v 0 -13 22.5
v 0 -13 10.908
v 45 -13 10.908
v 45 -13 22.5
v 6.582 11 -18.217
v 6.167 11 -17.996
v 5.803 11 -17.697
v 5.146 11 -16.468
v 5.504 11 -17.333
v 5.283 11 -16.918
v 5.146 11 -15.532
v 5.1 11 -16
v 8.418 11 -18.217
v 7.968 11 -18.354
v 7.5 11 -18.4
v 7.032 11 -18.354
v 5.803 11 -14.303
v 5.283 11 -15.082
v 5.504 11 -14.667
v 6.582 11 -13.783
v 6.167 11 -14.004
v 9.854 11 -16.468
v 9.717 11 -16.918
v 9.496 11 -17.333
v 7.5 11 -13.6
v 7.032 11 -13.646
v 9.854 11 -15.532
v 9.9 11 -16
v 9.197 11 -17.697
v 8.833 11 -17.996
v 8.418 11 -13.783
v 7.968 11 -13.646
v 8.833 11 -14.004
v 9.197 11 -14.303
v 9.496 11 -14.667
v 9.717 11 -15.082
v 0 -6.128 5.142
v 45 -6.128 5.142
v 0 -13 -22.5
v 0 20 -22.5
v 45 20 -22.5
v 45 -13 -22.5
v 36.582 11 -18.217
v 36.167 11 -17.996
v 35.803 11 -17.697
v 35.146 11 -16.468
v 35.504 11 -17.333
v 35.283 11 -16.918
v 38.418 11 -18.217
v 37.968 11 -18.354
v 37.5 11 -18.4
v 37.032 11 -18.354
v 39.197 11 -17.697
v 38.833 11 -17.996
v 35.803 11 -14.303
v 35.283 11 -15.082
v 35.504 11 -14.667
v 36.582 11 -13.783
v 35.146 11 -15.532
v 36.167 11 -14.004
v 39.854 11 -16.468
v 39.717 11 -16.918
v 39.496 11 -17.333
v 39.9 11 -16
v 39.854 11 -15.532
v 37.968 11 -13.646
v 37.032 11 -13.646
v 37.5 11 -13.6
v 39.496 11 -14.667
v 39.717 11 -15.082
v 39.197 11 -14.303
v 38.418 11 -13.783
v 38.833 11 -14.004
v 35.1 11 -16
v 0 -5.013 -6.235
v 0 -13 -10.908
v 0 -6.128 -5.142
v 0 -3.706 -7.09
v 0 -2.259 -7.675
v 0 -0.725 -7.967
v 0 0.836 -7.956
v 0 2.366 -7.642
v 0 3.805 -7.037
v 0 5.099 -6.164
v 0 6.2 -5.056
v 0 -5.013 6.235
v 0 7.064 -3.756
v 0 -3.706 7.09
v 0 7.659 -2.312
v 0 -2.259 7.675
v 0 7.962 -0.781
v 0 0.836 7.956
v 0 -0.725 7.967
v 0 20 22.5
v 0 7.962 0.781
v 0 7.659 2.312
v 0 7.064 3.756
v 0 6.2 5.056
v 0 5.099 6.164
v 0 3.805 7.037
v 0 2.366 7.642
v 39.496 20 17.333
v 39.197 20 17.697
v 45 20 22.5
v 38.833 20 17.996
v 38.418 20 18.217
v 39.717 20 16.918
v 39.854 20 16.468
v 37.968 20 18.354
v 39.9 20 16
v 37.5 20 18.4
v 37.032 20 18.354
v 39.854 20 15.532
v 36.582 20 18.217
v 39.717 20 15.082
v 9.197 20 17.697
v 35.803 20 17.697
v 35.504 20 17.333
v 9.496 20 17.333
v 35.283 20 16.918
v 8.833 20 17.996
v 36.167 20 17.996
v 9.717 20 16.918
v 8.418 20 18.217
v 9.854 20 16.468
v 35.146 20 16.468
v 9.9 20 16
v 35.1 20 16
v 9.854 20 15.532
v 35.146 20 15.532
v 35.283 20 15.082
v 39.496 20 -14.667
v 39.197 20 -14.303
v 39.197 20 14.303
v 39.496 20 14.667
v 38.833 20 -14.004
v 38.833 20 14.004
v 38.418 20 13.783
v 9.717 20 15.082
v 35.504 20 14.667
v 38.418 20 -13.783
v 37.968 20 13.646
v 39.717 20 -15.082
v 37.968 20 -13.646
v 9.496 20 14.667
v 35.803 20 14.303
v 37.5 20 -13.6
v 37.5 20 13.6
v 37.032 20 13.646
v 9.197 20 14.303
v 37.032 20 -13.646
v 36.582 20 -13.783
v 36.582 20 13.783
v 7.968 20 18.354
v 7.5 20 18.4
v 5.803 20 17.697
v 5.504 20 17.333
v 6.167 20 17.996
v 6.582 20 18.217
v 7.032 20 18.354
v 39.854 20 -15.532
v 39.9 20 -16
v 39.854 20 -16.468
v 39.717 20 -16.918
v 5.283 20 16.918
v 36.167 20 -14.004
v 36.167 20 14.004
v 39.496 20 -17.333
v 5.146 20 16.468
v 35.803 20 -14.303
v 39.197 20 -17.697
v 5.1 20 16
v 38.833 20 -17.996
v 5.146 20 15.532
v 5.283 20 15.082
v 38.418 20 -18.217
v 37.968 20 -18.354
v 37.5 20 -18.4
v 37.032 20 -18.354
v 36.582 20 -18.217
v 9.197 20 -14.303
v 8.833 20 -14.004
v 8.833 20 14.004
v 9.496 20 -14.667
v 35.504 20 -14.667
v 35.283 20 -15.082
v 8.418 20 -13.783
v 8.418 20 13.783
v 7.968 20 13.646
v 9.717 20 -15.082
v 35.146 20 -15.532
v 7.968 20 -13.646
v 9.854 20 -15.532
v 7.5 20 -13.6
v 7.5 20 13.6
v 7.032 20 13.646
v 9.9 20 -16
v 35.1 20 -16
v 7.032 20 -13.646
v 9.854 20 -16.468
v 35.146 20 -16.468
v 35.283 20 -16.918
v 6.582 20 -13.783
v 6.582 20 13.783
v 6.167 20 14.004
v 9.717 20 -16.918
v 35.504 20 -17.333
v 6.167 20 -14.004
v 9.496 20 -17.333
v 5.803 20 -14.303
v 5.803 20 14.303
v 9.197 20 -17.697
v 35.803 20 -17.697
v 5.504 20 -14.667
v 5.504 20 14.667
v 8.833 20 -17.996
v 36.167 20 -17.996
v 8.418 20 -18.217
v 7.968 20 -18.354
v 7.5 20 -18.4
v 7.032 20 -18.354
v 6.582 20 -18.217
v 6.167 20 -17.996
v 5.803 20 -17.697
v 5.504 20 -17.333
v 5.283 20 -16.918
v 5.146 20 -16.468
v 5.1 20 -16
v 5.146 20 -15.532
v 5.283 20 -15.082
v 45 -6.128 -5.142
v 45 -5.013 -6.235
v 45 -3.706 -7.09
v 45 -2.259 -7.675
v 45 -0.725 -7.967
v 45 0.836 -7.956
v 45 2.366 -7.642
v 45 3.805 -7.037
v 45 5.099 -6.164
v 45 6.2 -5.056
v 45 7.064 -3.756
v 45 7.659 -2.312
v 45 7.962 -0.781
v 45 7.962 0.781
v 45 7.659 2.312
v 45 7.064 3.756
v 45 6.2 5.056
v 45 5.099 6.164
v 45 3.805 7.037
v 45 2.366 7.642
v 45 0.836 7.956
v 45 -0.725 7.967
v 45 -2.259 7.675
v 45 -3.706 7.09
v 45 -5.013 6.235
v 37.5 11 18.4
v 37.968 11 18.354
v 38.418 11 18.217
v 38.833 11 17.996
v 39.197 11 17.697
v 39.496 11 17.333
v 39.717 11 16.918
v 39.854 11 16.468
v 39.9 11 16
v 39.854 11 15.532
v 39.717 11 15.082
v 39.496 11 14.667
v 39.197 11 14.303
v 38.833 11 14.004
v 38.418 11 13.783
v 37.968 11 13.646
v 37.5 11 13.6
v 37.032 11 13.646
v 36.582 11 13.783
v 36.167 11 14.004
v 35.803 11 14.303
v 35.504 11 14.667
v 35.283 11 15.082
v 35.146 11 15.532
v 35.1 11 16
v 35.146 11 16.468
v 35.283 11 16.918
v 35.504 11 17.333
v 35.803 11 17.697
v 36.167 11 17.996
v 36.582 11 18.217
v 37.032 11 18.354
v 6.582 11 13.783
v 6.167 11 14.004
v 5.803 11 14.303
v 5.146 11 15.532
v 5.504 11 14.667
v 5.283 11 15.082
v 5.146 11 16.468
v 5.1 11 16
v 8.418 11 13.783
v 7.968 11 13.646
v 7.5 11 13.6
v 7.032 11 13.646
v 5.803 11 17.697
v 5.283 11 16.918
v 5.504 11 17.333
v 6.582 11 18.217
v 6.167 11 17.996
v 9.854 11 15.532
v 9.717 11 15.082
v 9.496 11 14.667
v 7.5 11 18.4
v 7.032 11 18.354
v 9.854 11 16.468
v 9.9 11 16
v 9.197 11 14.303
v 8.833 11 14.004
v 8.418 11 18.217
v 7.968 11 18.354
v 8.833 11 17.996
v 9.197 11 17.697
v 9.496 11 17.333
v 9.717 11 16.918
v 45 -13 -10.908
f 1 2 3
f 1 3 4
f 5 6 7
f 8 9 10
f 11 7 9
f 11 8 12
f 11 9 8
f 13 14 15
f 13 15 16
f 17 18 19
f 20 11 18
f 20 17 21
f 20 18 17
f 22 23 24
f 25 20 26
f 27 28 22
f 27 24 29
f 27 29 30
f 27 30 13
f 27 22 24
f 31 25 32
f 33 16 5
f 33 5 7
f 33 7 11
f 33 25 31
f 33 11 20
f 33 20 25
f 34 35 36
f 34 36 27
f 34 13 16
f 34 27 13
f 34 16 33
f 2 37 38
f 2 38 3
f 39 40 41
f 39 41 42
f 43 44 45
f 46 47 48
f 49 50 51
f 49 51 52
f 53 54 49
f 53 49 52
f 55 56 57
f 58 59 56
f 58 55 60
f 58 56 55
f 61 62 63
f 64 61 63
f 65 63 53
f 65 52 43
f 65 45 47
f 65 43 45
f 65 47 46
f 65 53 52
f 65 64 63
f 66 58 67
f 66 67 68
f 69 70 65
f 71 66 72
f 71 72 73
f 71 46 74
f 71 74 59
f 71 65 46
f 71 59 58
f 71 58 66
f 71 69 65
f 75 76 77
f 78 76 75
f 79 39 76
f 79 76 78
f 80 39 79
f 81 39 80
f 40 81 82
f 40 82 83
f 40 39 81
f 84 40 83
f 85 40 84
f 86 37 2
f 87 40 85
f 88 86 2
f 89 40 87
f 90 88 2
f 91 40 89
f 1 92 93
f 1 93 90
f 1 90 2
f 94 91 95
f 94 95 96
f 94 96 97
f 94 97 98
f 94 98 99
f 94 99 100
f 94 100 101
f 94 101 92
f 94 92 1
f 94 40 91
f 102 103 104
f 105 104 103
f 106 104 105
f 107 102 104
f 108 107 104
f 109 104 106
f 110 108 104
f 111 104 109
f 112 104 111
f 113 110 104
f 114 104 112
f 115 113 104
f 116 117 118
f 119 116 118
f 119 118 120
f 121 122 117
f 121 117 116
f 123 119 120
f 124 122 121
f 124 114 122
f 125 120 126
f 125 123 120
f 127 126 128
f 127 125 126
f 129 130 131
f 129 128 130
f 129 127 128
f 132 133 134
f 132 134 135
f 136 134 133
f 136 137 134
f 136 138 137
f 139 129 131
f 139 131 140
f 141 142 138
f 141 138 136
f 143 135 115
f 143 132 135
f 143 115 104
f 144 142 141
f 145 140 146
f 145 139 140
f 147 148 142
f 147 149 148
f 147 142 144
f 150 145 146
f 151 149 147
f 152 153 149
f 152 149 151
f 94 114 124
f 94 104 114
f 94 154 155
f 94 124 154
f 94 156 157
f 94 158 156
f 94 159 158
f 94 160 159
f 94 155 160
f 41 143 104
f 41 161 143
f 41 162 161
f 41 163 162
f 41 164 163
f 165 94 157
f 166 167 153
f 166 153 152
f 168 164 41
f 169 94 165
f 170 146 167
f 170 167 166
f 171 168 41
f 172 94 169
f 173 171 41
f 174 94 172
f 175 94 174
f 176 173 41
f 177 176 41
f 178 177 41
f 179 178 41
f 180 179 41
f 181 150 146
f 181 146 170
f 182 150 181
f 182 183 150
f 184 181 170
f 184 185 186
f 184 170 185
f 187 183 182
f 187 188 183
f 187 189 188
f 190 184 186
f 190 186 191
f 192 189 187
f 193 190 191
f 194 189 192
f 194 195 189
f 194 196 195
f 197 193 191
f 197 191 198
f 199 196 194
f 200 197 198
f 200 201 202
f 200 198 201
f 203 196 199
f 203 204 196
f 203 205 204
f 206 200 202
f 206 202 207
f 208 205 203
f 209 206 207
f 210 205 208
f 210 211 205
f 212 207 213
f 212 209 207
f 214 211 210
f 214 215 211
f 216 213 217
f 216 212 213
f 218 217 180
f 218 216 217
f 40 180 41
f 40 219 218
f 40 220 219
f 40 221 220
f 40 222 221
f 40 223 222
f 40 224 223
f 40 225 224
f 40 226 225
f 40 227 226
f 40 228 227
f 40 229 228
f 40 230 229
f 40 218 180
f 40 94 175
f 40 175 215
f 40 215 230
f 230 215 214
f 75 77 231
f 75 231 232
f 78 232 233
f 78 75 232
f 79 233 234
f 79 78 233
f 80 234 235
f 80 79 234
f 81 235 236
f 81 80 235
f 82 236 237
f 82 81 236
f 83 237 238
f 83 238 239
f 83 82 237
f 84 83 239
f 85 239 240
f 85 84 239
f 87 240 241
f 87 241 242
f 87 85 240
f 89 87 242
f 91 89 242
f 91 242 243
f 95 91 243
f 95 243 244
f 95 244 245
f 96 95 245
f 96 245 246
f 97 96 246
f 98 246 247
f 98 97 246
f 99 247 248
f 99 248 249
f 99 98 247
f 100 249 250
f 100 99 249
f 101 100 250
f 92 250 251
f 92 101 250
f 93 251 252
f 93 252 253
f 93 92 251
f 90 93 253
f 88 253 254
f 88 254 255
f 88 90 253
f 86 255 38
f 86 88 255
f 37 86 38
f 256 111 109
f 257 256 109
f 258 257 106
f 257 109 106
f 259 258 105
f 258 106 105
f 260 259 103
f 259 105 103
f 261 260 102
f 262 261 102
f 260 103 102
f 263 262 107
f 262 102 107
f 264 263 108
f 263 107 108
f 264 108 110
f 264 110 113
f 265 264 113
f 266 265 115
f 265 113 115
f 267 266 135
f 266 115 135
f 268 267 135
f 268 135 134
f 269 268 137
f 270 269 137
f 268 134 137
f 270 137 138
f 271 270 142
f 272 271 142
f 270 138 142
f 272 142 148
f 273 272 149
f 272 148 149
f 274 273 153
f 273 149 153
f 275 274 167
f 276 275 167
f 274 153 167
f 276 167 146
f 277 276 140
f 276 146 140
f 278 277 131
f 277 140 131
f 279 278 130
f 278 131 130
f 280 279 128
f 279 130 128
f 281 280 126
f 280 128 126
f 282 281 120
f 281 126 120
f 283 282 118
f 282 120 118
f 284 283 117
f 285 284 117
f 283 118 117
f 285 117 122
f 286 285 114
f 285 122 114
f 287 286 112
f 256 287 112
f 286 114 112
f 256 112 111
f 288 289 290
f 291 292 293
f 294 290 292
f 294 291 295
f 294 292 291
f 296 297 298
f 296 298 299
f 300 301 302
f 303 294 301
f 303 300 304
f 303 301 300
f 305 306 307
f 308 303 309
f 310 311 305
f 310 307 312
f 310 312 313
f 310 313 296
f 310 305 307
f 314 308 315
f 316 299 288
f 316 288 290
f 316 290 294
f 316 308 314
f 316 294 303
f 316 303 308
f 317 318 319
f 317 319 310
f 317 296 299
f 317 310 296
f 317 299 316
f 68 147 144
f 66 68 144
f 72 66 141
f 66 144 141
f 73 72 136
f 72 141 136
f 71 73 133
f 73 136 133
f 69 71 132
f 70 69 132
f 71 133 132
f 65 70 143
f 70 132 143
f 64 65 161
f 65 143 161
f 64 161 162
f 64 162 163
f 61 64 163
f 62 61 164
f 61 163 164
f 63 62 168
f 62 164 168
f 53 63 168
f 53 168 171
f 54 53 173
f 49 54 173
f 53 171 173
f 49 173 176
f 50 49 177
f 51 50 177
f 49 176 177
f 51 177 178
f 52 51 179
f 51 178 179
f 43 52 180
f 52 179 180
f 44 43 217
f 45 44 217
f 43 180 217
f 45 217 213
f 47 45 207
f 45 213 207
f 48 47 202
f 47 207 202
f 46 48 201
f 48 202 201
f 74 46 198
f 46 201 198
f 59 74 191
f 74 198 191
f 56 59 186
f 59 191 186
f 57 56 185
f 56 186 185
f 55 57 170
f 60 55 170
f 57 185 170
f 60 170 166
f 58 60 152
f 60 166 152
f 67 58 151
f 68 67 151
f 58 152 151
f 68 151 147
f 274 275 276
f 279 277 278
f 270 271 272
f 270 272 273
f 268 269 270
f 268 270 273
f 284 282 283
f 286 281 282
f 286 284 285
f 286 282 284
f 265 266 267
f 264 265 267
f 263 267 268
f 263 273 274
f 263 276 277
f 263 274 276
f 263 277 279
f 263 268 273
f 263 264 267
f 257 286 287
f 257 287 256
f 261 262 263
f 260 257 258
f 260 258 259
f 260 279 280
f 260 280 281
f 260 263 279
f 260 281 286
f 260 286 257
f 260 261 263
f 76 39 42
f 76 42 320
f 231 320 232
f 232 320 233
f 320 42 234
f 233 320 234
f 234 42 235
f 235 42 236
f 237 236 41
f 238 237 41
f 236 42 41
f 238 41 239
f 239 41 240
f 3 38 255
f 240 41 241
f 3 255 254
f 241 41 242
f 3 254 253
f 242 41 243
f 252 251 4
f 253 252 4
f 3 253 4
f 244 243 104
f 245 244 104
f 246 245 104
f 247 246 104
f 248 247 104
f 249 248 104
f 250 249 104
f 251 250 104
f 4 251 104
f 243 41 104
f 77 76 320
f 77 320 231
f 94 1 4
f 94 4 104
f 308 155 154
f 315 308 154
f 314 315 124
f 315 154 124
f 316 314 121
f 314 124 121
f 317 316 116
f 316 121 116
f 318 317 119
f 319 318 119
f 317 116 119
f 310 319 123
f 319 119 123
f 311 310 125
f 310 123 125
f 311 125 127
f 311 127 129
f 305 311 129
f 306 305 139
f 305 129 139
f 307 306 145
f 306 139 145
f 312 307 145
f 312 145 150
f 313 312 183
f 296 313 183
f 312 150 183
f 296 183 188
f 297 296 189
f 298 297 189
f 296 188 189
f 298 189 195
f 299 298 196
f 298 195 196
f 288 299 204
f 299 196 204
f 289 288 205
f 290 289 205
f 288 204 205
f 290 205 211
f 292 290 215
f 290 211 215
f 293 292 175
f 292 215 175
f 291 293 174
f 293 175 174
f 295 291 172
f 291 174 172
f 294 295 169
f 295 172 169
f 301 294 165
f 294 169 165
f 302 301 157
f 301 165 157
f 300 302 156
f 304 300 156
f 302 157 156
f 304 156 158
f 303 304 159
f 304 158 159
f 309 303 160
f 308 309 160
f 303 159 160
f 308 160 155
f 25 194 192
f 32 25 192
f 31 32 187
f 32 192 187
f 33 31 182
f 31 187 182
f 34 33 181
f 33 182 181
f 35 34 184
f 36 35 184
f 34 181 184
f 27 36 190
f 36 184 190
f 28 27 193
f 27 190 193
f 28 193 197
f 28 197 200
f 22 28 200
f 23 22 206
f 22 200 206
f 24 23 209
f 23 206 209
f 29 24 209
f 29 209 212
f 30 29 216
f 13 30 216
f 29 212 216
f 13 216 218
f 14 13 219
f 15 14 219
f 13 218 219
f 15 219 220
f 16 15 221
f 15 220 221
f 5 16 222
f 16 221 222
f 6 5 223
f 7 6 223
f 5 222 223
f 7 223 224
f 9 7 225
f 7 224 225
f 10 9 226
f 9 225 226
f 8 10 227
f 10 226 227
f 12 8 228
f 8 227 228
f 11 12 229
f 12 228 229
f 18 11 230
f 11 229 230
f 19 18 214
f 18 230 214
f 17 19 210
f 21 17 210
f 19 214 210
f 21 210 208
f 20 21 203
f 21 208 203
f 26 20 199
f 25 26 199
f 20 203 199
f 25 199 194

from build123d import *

# Parameters (mm, degrees)
EXTRUDE_1_DEPTH     = 45
SKETCH_2_R          = 2.4
CUT_EXTRUDE_1_DEPTH = 9


with BuildPart() as part:
    # Эскиз1 → Бобышка-Вытянуть1 (new body)
    with BuildSketch(Plane(origin=(0, 0, 0), x_dir=(0, 0, -1), z_dir=(1, 0, 0))):
        with BuildLine():
            Line((-22.5, 20), (22.5, 20))
            Line((22.5, 20), (22.5, -13))
            Line((22.5, -13), (10.908295205, -13))
            Line((10.908295205, -13), (5.142300877, -6.128355545))
            ThreePointArc((5.142300877, -6.128355545), (0, 8), (-5.142300877, -6.128355545))
            Line((-5.142300877, -6.128355545), (-10.908295205, -13))
            Line((-10.908295205, -13), (-22.5, -13))
            Line((-22.5, -13), (-22.5, 20))
        make_face()
    extrude(amount=EXTRUDE_1_DEPTH)

    # Эскиз2 → Вырез-Вытянуть1 (cut)
    with BuildSketch(Plane(origin=(0, 20, 0), x_dir=(1, 0, 0), z_dir=(0, 1, 0))):
        with Locations((7.5, 16)):
            Circle(SKETCH_2_R)
        with Locations((37.5, 16)):
            Circle(SKETCH_2_R)
        with Locations((37.5, -16)):
            Circle(SKETCH_2_R)
        with Locations((7.5, -16)):
            Circle(SKETCH_2_R)
    extrude(amount=-CUT_EXTRUDE_1_DEPTH, mode=Mode.SUBTRACT)


solid = part.part
